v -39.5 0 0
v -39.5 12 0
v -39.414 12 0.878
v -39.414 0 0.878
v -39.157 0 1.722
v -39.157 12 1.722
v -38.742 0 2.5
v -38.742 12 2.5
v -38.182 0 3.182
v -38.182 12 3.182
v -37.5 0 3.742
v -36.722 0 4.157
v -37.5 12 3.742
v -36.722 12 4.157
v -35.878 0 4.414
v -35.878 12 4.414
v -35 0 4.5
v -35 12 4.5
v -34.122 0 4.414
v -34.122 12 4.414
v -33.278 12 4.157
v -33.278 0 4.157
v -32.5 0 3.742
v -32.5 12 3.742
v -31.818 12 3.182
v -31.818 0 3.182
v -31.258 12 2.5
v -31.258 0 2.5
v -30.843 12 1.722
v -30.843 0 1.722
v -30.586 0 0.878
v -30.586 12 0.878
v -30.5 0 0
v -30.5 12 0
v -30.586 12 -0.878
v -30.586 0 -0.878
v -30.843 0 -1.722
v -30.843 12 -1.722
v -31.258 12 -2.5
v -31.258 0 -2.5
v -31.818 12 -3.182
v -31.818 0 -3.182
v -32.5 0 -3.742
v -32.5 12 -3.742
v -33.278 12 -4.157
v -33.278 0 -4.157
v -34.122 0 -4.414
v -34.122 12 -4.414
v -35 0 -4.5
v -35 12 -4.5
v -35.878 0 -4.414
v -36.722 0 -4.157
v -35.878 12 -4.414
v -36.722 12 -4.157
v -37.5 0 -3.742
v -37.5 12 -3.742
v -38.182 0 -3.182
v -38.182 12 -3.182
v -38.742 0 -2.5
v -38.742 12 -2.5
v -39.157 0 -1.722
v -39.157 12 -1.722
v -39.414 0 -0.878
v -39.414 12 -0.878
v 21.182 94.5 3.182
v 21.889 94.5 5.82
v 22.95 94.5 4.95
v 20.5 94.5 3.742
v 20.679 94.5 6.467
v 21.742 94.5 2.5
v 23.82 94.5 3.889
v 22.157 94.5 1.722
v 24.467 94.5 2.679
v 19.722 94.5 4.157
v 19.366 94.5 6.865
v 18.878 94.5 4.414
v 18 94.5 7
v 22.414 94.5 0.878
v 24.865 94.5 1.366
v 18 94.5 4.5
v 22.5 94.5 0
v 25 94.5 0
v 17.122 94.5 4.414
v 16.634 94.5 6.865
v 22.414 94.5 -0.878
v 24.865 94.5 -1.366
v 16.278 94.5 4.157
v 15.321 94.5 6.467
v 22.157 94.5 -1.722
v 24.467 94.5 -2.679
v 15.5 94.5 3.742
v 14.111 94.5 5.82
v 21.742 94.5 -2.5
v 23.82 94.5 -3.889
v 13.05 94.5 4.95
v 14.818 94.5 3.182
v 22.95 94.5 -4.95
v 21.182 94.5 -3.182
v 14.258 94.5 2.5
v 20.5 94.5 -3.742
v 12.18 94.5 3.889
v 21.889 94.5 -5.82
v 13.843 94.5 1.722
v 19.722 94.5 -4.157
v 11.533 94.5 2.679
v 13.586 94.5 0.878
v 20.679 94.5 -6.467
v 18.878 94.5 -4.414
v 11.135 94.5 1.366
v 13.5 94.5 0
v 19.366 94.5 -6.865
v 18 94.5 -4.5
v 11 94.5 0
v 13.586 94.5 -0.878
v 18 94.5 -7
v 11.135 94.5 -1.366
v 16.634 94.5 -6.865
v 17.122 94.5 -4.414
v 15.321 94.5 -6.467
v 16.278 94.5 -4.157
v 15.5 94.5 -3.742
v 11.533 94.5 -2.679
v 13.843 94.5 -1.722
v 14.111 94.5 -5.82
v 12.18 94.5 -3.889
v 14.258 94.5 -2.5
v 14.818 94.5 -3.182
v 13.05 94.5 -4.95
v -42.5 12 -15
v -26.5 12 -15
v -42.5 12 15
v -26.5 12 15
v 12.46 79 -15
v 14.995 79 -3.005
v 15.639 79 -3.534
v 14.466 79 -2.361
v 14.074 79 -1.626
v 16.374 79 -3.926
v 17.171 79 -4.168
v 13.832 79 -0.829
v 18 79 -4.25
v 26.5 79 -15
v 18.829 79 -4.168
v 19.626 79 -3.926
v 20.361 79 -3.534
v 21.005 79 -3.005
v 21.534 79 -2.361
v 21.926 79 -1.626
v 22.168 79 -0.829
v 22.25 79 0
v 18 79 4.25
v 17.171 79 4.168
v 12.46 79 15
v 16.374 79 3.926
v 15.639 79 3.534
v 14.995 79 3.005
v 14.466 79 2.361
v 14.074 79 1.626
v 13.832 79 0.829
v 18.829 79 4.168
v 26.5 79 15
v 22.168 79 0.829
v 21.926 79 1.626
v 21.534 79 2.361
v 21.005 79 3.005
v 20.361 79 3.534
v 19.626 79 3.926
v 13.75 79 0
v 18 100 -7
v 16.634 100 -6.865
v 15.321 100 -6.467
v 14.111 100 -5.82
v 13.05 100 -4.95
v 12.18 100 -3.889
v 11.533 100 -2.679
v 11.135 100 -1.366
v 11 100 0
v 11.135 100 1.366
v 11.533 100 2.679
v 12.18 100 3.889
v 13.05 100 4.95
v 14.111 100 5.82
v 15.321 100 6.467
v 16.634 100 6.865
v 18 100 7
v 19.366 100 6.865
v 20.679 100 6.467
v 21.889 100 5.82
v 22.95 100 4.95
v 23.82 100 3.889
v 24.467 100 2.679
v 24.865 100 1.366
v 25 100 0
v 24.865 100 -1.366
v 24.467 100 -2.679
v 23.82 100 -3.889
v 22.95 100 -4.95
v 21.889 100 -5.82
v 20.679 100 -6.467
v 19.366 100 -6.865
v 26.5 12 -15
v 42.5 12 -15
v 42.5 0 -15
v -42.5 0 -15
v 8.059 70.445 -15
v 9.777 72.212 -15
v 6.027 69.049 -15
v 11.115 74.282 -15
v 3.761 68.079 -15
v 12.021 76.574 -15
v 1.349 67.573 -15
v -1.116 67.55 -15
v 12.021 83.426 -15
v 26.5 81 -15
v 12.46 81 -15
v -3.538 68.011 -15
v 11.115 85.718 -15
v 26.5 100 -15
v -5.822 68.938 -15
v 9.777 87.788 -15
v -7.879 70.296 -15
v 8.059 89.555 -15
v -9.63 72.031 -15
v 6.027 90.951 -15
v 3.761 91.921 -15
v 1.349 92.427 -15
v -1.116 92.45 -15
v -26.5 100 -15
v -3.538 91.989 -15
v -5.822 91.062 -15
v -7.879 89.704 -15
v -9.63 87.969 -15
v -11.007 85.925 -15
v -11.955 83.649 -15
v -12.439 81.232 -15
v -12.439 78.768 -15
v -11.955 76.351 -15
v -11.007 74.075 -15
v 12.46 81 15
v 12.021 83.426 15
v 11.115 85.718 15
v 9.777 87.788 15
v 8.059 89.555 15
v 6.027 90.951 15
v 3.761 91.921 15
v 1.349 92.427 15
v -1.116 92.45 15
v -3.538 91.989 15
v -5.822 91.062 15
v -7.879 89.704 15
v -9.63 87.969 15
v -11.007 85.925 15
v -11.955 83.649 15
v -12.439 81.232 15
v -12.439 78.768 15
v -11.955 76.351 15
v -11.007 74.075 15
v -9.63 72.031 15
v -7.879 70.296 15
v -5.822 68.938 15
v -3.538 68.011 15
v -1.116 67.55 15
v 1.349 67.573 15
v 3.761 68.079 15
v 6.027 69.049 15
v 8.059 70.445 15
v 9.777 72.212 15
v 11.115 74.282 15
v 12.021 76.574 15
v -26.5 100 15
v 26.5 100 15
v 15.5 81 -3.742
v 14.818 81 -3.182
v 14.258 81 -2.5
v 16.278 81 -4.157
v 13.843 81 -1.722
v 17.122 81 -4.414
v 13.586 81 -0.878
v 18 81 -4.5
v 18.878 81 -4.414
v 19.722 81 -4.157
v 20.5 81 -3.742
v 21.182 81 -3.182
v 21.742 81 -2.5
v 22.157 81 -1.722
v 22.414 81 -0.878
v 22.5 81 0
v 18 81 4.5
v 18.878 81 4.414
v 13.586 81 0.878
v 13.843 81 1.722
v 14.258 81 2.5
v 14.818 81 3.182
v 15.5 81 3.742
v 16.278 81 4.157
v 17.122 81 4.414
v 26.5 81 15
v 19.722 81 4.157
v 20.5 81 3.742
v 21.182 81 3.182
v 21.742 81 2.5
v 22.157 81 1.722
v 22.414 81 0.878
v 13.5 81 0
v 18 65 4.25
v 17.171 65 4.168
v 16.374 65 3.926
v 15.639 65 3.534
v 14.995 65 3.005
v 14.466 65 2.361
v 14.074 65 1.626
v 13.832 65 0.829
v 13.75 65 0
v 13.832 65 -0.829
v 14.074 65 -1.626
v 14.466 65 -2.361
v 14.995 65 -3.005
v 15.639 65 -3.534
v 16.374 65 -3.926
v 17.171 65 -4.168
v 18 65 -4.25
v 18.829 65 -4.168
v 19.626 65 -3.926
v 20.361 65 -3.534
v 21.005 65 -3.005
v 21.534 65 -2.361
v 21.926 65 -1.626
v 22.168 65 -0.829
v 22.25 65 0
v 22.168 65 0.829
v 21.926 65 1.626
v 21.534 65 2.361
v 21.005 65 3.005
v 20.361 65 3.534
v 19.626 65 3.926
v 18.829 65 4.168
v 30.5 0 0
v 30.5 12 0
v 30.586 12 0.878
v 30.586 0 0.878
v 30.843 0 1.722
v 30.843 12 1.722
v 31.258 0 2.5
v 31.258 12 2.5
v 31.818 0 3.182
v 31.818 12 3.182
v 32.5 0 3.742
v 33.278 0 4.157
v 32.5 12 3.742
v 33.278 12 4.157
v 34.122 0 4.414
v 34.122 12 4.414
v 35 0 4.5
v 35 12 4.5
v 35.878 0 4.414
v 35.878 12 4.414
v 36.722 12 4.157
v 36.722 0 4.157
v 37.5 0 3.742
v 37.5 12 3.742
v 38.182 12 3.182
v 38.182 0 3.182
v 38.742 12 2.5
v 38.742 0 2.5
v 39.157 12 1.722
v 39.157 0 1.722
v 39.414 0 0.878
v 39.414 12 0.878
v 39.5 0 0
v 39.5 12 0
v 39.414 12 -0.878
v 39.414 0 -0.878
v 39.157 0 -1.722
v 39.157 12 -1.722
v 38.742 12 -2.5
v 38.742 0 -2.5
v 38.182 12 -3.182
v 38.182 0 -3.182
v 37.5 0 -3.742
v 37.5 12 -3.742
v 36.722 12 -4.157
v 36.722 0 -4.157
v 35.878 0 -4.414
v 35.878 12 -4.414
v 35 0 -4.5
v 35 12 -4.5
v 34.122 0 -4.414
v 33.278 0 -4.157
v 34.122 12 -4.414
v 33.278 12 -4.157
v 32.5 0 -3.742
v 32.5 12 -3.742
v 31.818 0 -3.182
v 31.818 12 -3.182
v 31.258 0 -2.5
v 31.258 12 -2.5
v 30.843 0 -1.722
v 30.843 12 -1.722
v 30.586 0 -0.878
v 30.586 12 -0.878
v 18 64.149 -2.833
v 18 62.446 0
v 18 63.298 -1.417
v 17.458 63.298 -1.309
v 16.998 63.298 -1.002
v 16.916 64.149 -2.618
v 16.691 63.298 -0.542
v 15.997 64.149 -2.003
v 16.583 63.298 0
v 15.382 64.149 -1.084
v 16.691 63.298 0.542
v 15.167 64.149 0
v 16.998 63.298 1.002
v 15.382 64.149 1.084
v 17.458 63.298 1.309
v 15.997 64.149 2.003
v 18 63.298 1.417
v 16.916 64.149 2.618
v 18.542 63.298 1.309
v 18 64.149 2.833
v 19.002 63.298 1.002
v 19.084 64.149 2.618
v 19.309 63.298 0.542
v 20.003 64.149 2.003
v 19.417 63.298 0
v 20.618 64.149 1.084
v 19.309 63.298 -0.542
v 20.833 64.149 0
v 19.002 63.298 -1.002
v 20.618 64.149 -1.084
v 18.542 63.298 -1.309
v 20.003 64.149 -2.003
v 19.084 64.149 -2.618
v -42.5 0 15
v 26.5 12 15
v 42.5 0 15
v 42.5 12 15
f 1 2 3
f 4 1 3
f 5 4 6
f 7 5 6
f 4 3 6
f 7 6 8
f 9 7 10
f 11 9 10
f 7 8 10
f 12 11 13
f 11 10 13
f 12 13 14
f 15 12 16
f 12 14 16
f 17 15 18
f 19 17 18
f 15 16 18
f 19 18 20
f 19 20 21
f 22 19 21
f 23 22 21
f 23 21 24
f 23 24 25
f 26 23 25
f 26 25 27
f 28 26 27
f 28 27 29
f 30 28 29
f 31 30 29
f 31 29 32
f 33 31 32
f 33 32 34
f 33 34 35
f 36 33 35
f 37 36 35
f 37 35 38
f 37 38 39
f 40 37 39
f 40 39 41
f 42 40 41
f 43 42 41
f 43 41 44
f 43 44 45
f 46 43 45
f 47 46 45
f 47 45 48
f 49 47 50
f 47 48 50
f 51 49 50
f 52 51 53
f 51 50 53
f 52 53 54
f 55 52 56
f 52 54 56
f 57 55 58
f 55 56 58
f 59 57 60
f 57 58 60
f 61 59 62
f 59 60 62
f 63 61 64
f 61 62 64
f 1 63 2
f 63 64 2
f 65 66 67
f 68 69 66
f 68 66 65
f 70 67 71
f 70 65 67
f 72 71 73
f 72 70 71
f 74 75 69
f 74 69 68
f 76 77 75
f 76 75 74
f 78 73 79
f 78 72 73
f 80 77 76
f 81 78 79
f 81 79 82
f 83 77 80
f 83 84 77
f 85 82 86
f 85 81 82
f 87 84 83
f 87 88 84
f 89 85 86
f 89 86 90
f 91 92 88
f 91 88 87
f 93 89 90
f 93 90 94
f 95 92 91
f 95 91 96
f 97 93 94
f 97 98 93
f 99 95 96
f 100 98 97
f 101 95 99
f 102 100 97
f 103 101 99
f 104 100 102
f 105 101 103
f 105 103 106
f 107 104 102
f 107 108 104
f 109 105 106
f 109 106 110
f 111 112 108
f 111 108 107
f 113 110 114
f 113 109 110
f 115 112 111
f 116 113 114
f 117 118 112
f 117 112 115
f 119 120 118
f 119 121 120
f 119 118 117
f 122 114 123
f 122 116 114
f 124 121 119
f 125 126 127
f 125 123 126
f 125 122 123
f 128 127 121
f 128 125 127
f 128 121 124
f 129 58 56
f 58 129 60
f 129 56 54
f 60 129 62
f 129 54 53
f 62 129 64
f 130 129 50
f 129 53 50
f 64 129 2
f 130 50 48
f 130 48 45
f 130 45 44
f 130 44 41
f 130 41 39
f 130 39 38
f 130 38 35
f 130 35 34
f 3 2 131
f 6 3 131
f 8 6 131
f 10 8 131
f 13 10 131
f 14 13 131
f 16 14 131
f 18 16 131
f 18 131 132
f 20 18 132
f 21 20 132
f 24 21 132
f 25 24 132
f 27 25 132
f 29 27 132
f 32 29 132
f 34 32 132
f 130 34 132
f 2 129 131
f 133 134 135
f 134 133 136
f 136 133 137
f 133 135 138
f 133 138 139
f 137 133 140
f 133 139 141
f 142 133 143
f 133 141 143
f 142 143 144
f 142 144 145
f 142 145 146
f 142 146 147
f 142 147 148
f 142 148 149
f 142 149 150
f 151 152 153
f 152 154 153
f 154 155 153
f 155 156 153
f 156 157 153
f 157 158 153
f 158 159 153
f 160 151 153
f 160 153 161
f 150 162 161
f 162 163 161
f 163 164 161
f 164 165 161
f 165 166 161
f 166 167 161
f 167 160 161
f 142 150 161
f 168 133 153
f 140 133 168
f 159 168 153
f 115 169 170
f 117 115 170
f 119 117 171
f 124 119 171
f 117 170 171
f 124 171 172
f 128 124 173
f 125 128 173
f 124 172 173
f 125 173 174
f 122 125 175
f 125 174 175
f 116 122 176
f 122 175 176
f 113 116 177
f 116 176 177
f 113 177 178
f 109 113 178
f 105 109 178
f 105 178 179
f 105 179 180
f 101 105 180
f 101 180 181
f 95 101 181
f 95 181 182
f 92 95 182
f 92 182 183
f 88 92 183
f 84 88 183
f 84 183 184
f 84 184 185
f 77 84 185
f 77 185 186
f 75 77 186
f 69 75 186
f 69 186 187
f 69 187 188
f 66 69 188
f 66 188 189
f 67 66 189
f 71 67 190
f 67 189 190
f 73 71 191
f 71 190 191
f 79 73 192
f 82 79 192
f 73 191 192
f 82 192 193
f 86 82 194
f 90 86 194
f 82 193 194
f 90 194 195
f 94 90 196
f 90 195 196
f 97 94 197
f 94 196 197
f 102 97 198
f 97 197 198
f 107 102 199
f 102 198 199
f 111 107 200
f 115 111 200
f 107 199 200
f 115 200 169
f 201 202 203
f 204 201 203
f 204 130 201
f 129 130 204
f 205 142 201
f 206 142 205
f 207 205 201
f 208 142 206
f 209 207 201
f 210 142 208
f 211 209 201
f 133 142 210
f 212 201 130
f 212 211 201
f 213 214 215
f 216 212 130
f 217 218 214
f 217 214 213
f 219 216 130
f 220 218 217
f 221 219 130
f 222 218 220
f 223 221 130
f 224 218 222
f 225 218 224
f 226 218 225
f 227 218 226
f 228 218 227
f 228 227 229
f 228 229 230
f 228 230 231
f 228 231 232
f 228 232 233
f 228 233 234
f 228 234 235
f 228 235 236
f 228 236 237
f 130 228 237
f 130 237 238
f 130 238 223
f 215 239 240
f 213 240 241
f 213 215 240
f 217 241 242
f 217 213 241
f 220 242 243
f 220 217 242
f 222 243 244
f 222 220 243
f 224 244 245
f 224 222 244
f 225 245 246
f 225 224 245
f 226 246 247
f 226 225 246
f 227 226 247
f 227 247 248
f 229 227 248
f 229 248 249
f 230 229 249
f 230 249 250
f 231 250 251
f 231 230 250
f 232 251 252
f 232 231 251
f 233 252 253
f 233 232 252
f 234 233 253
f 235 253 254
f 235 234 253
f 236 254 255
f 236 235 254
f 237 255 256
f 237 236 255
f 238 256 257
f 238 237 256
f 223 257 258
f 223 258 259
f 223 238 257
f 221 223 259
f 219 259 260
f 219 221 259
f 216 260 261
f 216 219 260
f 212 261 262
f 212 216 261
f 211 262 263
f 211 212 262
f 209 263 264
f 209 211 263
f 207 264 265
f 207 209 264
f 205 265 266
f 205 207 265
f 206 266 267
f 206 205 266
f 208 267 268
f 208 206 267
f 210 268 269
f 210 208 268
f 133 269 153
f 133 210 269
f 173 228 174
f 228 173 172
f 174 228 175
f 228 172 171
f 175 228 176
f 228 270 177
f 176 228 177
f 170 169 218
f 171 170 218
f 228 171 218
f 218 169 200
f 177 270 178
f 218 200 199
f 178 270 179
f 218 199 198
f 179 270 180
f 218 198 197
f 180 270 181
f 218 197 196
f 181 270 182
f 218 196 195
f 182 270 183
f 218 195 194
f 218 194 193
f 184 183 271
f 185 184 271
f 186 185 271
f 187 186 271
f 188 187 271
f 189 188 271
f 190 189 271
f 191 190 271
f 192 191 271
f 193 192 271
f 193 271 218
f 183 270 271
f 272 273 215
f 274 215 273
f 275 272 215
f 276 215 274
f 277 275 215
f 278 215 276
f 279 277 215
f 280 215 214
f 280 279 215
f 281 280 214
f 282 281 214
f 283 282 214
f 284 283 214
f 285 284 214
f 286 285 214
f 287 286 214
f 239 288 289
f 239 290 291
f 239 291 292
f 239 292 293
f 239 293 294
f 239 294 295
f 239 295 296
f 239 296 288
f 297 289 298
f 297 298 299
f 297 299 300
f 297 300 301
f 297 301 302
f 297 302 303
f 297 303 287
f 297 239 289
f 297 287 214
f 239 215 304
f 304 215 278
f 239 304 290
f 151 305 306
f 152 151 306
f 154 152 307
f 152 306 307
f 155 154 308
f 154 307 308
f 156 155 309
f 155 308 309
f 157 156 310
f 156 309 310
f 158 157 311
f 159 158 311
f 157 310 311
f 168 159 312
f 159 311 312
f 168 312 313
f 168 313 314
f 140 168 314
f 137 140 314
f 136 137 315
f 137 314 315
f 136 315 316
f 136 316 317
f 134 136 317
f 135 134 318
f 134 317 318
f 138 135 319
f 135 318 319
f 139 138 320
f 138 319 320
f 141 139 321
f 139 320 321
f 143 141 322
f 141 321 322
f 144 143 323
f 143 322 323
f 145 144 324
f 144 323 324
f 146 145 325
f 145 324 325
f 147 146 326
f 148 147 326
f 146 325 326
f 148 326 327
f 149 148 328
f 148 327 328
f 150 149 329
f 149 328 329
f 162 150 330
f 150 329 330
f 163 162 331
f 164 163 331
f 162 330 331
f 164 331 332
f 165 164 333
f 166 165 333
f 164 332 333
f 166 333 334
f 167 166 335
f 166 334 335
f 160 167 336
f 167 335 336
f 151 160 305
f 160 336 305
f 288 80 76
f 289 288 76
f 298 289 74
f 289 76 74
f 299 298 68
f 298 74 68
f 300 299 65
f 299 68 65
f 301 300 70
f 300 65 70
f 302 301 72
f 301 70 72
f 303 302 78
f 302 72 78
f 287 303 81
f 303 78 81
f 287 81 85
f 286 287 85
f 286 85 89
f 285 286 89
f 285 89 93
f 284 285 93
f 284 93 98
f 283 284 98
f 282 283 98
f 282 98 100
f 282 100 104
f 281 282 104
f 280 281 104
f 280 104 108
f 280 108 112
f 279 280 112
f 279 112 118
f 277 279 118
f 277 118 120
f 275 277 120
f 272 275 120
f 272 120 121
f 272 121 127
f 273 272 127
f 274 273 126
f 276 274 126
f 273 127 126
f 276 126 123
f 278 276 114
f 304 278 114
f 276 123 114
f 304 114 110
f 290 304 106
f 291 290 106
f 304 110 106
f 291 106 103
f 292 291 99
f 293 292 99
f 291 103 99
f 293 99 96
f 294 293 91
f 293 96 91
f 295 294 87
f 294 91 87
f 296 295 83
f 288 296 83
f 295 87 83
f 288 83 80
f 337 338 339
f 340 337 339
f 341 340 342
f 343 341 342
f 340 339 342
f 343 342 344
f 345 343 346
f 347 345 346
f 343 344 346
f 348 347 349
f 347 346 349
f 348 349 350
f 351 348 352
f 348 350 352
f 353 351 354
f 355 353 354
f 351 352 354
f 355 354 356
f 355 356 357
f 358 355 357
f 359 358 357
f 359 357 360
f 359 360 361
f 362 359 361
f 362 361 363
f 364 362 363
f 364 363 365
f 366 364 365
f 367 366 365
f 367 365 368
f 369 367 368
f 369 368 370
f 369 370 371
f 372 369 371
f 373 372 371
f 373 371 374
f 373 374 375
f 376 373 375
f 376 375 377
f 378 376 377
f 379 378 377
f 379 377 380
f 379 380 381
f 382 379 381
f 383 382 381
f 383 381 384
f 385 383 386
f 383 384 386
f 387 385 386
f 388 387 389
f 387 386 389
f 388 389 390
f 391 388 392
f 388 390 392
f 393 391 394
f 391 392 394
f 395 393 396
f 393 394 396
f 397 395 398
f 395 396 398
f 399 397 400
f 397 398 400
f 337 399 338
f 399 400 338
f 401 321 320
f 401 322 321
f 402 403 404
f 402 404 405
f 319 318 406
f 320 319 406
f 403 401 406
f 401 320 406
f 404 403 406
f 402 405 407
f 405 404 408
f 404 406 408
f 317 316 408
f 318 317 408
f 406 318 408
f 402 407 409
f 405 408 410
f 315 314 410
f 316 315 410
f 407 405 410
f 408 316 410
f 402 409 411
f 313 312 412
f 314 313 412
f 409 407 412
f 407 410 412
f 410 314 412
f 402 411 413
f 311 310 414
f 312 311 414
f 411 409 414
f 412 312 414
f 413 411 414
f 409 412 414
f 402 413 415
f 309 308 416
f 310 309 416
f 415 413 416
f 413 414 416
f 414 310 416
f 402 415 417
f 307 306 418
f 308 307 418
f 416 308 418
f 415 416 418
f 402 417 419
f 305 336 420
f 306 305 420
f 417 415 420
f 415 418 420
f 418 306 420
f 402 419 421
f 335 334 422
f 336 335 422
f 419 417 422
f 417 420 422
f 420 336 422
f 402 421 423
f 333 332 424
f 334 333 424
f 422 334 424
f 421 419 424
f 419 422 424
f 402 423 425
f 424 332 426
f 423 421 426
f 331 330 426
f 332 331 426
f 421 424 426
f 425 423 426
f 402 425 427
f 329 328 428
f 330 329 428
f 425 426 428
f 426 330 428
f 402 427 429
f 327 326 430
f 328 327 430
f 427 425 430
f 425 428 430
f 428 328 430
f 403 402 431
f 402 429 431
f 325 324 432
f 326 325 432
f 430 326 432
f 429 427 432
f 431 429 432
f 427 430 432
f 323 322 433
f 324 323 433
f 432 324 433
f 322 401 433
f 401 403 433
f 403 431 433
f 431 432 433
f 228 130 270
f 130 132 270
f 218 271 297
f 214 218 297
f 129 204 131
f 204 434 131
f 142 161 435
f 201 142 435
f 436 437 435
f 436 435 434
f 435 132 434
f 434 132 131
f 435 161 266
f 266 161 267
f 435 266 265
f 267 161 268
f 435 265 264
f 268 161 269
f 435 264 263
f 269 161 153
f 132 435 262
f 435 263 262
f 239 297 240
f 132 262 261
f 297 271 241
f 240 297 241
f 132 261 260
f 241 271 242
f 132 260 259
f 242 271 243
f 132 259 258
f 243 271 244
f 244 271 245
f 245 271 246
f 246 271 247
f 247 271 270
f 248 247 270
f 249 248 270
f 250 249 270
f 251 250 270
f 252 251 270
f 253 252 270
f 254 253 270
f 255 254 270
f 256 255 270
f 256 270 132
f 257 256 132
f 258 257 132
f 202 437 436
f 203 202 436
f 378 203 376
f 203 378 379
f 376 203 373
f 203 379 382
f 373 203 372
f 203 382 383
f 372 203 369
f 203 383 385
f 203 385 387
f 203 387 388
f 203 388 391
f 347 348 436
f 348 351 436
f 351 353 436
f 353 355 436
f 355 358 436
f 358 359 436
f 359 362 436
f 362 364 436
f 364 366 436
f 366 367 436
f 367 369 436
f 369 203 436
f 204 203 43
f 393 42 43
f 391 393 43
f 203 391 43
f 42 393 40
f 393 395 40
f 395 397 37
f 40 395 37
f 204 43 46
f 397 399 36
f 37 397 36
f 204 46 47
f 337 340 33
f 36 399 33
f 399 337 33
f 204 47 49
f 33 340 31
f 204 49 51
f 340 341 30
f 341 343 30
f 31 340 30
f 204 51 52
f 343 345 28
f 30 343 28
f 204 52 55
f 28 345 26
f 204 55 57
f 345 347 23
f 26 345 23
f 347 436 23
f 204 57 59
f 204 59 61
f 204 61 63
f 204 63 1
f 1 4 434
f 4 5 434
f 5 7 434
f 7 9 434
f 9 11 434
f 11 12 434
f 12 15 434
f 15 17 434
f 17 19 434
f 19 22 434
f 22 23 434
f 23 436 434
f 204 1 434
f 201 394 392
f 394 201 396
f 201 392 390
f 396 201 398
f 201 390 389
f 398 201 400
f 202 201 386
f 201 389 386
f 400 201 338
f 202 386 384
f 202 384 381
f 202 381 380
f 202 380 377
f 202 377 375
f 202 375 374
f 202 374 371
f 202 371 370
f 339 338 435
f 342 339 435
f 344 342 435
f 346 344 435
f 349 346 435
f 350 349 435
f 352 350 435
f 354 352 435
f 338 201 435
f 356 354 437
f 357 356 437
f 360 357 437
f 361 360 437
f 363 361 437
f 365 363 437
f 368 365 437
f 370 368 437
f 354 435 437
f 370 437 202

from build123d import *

# Parameters (mm, degrees)
SKETCH_1_R                   = 12.5
EXTRUDE_1_DEPTH              = 15
HOLE_WIZARD_1_D              = 9
HOLE_WIZARD_1_DEPTH          = 100
SKETCH_4_W                   = 53.346686235
SKETCH_4_H                   = 2
CUT_EXTRUDE_1_DEPTH          = 113.722003176
HOLE_WIZARD_M8_1_D           = 8.5
HOLE_WIZARD_M8_1_DEPTH       = 35
HOLE_WIZARD_M8_1_CBORE_D     = 14
HOLE_WIZARD_M8_1_CBORE_DEPTH = 5.5
HOLE_WIZARD_M8_1_TIP         = 2.553657631
CUT_EXTRUDE_2_REACH          = 106.697
SKETCH_8_R                   = 4.5


with BuildPart() as part:
    # 草图1 → 凸台-拉伸1 (new, symmetric)
    with BuildSketch(Plane.XY):
        Polygon((42.5, 0), (-42.5, 0), (-42.5, 12), (-26.5, 12), (-26.5, 100), (26.5, 100), (26.5, 12), (42.5, 12), align=None)
        with Locations((0, 80)):
            Circle(SKETCH_1_R, mode=Mode.SUBTRACT)
    extrude(amount=EXTRUDE_1_DEPTH, both=True)

    # 孔1
    with Locations(Plane.XZ):
        with Locations((-35, 0), (35, 0)):
            Hole(HOLE_WIZARD_1_D / 2, depth=HOLE_WIZARD_1_DEPTH)

    # 草图4 → 切除-拉伸1 (cut, through all)
    with BuildSketch(Plane.XY.offset(15)):
        with Locations((33.672264203, 80)):
            Rectangle(SKETCH_4_W, SKETCH_4_H)
    extrude(amount=-CUT_EXTRUDE_1_DEPTH, mode=Mode.SUBTRACT)

    # M8 六角头螺钉的柱形沉头孔1
    with Locations(Plane(origin=(-72.699544071, 100, 2.28188546), x_dir=(0, 0, -1), z_dir=(0, 1, 0))):
        with Locations((2.28188546, -90.699544071)):
            CounterBoreHole(HOLE_WIZARD_M8_1_D / 2, HOLE_WIZARD_M8_1_CBORE_D / 2, HOLE_WIZARD_M8_1_CBORE_DEPTH, depth=HOLE_WIZARD_M8_1_DEPTH)
            with Locations((0, 0, -(HOLE_WIZARD_M8_1_DEPTH + HOLE_WIZARD_M8_1_TIP / 2))):  # 118° drill point
                Cone(0, HOLE_WIZARD_M8_1_D / 2, HOLE_WIZARD_M8_1_TIP, mode=Mode.SUBTRACT)

    # 草图8 → 切除-拉伸2 (cut, up to next)
    with BuildSketch(Plane(origin=(0, 94.5, 0), x_dir=(1, 0, 0), z_dir=(0, 1, 0)), mode=Mode.PRIVATE) as cut_extrude_2_sk1:
        with Locations(Location((18, 0, 0), (0, 0, 270))):
            Circle(SKETCH_8_R)
    cut_extrude_2_tool1 = extrude(cut_extrude_2_sk1.sketch, amount=-CUT_EXTRUDE_2_REACH, mode=Mode.PRIVATE) & part.part
    add(cut_extrude_2_tool1.solids().sort_by_distance((18, 94.5, 0))[0], mode=Mode.SUBTRACT)


solid = part.part
